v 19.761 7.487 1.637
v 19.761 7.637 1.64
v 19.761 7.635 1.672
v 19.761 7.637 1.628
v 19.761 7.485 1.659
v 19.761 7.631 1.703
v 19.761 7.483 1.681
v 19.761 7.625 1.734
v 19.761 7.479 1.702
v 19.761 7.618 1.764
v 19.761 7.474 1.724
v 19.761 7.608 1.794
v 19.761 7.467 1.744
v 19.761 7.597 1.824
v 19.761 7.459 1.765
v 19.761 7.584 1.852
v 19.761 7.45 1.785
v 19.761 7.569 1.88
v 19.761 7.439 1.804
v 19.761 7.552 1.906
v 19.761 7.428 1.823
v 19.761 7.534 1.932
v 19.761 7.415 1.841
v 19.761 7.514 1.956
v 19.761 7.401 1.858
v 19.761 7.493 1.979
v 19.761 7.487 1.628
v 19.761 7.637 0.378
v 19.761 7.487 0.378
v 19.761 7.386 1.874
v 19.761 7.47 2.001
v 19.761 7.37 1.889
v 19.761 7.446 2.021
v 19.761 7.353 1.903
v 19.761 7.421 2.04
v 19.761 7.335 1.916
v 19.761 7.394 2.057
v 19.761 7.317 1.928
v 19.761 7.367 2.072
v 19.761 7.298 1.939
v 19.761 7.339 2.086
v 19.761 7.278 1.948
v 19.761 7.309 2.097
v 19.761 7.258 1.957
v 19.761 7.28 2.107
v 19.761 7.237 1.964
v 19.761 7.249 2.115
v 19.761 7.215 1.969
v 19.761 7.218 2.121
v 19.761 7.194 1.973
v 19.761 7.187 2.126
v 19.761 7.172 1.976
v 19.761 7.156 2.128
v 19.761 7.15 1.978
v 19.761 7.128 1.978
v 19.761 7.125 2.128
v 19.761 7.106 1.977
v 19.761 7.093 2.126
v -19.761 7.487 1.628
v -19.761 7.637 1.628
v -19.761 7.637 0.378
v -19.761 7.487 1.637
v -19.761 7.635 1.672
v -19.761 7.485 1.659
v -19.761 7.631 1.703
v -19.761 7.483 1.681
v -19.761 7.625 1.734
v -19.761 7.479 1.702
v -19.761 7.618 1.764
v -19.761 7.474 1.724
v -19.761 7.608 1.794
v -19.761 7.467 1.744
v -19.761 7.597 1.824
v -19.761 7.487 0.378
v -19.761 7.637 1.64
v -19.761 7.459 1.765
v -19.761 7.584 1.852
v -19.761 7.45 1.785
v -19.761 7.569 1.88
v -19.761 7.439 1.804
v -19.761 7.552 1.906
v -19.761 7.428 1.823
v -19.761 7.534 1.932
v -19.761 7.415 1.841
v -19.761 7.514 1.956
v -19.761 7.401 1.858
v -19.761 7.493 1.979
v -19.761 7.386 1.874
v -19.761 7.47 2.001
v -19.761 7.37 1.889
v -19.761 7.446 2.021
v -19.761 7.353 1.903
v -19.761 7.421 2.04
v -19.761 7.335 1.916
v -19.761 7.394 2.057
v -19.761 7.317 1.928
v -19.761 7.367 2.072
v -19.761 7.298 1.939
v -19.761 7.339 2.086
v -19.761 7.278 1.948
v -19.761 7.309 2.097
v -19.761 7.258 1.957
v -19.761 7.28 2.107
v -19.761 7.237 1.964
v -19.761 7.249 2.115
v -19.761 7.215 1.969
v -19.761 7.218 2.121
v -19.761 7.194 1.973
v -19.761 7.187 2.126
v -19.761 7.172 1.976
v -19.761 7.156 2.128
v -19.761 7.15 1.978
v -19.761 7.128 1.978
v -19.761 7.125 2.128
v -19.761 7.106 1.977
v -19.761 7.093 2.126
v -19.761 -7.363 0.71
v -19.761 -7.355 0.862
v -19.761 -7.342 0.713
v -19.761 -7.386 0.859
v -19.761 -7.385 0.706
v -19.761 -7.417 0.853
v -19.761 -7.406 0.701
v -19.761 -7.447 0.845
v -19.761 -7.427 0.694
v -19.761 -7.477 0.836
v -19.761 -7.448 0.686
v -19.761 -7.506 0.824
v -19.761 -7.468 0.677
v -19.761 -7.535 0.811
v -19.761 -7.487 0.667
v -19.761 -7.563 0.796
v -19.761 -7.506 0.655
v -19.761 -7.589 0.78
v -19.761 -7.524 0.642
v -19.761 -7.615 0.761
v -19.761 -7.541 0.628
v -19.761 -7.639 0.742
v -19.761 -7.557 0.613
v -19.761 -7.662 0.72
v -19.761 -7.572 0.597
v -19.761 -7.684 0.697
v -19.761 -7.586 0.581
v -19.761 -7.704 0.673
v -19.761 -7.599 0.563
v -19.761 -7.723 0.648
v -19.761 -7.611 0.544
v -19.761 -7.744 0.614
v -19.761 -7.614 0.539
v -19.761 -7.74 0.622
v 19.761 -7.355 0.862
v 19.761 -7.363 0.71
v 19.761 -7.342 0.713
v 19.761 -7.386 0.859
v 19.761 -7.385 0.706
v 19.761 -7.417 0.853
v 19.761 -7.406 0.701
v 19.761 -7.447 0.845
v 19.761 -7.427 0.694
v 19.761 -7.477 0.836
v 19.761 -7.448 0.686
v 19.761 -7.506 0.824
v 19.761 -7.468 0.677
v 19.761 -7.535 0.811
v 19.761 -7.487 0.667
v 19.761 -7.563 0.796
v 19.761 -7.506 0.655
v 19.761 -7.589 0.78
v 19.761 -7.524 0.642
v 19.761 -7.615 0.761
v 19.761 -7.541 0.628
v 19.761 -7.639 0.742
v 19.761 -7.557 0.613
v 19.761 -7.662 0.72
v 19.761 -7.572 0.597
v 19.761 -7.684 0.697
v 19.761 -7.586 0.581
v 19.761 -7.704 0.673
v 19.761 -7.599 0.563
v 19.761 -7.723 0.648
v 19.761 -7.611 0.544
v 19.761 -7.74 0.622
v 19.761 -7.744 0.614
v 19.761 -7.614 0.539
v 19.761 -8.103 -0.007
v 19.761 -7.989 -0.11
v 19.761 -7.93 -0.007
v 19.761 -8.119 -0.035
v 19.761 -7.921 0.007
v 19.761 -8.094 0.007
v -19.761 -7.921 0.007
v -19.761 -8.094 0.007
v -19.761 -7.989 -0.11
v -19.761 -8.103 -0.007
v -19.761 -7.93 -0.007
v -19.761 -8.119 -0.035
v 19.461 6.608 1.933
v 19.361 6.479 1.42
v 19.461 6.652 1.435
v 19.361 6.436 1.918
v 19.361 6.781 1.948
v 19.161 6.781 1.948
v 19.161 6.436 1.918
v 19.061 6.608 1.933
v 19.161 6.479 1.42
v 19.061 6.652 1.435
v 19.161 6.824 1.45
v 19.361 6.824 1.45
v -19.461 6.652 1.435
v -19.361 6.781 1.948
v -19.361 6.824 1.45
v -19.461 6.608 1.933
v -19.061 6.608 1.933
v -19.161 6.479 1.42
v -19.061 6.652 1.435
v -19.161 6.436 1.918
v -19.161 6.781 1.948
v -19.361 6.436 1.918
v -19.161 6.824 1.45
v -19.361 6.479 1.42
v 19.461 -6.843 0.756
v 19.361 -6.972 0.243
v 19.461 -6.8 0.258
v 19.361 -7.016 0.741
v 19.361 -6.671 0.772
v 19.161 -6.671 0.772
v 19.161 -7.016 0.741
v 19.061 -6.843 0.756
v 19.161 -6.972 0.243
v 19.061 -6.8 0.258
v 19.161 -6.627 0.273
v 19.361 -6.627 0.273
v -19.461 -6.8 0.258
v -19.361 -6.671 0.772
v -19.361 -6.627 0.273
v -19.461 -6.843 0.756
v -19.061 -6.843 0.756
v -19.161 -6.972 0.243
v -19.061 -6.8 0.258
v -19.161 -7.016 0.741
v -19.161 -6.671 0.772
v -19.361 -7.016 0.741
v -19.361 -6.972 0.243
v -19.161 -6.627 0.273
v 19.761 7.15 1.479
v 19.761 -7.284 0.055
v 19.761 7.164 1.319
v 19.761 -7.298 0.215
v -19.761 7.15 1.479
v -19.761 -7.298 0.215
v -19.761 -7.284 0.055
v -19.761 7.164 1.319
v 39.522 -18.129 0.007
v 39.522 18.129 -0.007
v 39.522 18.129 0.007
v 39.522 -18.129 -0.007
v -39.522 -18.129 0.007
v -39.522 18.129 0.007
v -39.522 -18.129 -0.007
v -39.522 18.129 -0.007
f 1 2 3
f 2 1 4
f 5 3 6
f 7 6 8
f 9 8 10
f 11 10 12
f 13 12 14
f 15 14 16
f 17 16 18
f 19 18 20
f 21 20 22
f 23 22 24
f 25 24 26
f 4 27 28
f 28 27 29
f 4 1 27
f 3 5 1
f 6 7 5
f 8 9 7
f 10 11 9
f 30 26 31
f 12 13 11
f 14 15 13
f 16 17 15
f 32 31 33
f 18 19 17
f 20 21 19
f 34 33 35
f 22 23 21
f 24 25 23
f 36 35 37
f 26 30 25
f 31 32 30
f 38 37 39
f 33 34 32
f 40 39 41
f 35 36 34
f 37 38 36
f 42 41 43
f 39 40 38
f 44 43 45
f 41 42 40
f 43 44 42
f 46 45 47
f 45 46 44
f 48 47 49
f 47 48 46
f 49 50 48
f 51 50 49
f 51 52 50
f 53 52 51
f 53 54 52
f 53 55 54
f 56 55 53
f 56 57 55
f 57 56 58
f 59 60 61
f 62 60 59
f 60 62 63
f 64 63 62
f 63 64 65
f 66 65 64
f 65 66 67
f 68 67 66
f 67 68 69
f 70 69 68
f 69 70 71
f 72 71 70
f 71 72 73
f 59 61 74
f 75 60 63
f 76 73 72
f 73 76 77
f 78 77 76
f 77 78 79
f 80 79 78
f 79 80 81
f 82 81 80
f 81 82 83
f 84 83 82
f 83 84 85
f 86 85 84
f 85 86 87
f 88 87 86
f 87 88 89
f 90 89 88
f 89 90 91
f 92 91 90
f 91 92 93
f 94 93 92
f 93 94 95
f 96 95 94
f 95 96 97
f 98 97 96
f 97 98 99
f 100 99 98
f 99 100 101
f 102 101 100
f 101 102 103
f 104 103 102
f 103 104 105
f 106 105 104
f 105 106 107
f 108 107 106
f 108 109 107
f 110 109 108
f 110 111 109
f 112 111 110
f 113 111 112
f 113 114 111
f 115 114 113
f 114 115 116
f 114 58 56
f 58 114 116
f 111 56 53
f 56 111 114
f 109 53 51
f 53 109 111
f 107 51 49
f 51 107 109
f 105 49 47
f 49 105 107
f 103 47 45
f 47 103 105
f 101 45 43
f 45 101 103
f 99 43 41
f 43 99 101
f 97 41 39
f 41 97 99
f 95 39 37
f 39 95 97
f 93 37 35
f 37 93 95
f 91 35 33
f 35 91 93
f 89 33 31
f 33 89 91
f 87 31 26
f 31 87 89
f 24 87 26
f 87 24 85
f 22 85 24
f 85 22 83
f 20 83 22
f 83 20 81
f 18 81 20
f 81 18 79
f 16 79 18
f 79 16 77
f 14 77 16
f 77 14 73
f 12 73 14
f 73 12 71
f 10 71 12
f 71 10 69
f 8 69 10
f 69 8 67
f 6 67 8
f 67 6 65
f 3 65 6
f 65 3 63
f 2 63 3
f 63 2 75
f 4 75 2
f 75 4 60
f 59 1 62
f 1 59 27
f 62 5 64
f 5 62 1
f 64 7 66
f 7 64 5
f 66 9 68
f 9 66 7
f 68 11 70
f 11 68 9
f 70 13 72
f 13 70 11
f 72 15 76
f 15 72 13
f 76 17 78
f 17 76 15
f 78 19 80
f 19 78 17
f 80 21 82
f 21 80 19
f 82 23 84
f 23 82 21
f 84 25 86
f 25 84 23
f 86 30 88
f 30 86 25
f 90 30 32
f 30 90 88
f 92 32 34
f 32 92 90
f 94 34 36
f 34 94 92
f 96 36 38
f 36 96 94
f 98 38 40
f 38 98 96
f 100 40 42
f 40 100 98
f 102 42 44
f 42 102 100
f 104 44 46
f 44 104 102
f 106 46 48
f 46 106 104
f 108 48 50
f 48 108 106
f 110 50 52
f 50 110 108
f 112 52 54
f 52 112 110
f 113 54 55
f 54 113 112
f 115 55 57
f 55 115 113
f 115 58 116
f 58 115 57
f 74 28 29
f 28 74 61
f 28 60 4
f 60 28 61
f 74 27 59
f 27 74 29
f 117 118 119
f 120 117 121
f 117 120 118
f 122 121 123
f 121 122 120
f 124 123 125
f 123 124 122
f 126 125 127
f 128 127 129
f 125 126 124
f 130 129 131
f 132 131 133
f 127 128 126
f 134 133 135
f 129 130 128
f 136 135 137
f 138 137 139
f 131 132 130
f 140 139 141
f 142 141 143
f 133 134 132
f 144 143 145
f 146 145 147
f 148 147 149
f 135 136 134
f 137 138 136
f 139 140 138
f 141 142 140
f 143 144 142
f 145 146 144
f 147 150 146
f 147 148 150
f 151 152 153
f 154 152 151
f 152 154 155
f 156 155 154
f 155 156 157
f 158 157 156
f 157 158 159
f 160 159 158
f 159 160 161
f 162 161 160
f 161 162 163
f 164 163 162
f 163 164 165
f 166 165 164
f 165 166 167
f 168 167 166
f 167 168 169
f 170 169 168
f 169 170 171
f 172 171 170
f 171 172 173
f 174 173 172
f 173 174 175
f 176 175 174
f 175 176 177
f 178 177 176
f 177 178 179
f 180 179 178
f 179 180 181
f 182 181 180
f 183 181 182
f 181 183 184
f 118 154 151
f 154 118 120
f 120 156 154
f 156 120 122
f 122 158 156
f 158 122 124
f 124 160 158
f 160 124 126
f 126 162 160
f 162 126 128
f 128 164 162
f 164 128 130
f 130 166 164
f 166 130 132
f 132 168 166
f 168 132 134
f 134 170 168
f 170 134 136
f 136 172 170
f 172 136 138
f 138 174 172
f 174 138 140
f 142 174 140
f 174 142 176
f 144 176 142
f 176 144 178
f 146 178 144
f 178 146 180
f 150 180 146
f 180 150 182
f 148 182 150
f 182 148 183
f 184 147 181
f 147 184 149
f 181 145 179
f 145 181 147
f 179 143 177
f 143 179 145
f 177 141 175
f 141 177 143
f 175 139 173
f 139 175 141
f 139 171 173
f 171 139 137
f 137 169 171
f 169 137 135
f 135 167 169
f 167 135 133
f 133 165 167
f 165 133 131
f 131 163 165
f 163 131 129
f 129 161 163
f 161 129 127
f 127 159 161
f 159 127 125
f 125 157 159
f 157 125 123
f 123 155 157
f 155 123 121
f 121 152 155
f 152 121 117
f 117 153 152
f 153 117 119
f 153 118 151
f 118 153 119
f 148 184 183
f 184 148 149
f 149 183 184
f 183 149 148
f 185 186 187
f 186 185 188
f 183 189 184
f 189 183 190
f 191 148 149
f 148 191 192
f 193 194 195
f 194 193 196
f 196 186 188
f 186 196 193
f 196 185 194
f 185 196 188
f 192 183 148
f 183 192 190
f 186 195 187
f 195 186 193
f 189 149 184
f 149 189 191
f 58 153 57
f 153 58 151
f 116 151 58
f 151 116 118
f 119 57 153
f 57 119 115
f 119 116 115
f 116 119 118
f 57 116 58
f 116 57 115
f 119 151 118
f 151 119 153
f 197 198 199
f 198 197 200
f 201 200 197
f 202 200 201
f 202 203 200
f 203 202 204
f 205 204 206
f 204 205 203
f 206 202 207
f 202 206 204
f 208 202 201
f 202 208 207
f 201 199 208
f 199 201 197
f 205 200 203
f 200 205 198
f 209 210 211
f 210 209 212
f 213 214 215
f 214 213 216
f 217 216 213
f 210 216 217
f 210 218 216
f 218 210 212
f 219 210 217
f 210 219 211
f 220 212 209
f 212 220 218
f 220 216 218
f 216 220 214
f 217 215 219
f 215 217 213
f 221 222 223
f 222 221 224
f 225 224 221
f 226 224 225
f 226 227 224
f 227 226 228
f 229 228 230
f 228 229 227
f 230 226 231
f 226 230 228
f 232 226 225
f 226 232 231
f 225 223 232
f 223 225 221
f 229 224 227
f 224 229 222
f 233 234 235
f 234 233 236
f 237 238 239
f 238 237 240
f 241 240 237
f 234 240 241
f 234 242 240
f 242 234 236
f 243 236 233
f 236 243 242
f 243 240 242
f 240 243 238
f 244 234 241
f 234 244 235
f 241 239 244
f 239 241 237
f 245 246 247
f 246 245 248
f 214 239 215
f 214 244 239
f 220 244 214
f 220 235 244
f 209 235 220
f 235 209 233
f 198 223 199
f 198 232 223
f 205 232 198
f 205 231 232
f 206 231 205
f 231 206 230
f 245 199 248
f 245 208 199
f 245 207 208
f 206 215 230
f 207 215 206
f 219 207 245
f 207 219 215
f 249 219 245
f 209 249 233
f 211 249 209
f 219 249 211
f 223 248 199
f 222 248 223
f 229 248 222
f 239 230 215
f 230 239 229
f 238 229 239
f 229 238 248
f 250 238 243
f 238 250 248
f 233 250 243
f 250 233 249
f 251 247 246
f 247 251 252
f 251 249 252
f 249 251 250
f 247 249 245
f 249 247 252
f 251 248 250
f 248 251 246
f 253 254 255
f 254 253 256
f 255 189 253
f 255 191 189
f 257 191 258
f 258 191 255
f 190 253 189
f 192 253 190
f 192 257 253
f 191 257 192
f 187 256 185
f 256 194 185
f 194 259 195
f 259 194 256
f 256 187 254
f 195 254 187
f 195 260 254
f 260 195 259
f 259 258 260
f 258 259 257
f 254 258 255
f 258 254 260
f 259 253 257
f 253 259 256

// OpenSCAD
plate_w=39.522;
plate_h=14.503;
plate_t=0.15;
plate_rt=.5;
plate_rth=1.25;
plate_rbh=.75;
plate_rta=85;
plate_rba=125;

pcb_w=39.522;
pcb_h=14.503;
pcb_t=0.16;

plate_pcb_sep_r=0.2;
plate_pcb_sep_h=.5;
plate_pcb_sep_wm=0.5;
plate_pcb_sep_hm=0.5;

module plate_border(w,h,t,rt,rh,ra) {
  translate([0,h/2,-rt+t/2]){
  rotate([0,-90,0]){
  union(){
    difference() {
      linear_extrude (height=w,center=true) { difference() {
        $fn=100;
        circle(r=rt);
        circle(r=rt-t);
      }}
      translate ([0,-rt/2,0]) { cube([2.5*rt,rt,w*1.5],center=true); }
      rotate([0,0,-ra]) { translate ([0,-rt/2,0]) { cube([2.5*rt,rt,w*1.5],center=true); } }
  }
    translate([-(rt-t/2)*sin(90-ra)-(rh/2)*cos(90-ra),(rt-t/2)*cos(90-ra)-(rh/2)*sin(90-ra),0]) {
      rotate([0,0,90-ra]) { cube([rh,t,w],center=true); }
    }
  }}}    
}

module plate (w,h,t,rt,rth,,rbh,rta,rba) {
  cube([w,h,t],center=true);
  plate_border(w,h,t,rt,rth,rta);
  rotate([0,0,180]) { plate_border(w,h,t,rt,rbh,rba); }
}

module backplate (w,h,t) {
  cube([w,h,t],center=true);
}

module pcb (w,h,t) {
  cube([w,h,t],center=true);
}

module plate_pcb_sep (r,h) {
  linear_extrude (height=h,center=true) {
    circle(r=r,$fn=6);
  }
}

module plate_pcb_seps (sr,sh,w,h,wm,hm) {
  translate([w/2-wm,h/2-hm,-sh/2]) {plate_pcb_sep(sr,sh);}
  translate([-w/2+wm,h/2-hm,-sh/2]) {plate_pcb_sep(sr,sh);}
  translate([w/2-wm,-h/2+hm,-sh/2]) {plate_pcb_sep(sr,sh);}
  translate([-w/2+wm,-h/2+hm,-sh/2]) {plate_pcb_sep(sr,sh);}
}

rotate ([90-plate_rta,0,0]) {
translate ([0,0,1.35]) {

translate([0,0,plate_t/2]){
  color( "LightSteelBlue", 1) {
    plate(plate_w,plate_h,plate_t,plate_rt,plate_rth,plate_rbh,plate_rta,plate_rba);
  }
}

translate([0,0,-pcb_t/2-plate_pcb_sep_h]){
  color( "DarkGreen", 1) {
    pcb(pcb_w,pcb_h,pcb_t);
  }
}

plate_pcb_seps(plate_pcb_sep_r,plate_pcb_sep_h,plate_w,plate_h,plate_pcb_sep_wm,plate_pcb_sep_hm);

}}

translate([0,0,0]) { backplate(2*plate_w,2*plate_h*1.25,0.1*plate_t); }
